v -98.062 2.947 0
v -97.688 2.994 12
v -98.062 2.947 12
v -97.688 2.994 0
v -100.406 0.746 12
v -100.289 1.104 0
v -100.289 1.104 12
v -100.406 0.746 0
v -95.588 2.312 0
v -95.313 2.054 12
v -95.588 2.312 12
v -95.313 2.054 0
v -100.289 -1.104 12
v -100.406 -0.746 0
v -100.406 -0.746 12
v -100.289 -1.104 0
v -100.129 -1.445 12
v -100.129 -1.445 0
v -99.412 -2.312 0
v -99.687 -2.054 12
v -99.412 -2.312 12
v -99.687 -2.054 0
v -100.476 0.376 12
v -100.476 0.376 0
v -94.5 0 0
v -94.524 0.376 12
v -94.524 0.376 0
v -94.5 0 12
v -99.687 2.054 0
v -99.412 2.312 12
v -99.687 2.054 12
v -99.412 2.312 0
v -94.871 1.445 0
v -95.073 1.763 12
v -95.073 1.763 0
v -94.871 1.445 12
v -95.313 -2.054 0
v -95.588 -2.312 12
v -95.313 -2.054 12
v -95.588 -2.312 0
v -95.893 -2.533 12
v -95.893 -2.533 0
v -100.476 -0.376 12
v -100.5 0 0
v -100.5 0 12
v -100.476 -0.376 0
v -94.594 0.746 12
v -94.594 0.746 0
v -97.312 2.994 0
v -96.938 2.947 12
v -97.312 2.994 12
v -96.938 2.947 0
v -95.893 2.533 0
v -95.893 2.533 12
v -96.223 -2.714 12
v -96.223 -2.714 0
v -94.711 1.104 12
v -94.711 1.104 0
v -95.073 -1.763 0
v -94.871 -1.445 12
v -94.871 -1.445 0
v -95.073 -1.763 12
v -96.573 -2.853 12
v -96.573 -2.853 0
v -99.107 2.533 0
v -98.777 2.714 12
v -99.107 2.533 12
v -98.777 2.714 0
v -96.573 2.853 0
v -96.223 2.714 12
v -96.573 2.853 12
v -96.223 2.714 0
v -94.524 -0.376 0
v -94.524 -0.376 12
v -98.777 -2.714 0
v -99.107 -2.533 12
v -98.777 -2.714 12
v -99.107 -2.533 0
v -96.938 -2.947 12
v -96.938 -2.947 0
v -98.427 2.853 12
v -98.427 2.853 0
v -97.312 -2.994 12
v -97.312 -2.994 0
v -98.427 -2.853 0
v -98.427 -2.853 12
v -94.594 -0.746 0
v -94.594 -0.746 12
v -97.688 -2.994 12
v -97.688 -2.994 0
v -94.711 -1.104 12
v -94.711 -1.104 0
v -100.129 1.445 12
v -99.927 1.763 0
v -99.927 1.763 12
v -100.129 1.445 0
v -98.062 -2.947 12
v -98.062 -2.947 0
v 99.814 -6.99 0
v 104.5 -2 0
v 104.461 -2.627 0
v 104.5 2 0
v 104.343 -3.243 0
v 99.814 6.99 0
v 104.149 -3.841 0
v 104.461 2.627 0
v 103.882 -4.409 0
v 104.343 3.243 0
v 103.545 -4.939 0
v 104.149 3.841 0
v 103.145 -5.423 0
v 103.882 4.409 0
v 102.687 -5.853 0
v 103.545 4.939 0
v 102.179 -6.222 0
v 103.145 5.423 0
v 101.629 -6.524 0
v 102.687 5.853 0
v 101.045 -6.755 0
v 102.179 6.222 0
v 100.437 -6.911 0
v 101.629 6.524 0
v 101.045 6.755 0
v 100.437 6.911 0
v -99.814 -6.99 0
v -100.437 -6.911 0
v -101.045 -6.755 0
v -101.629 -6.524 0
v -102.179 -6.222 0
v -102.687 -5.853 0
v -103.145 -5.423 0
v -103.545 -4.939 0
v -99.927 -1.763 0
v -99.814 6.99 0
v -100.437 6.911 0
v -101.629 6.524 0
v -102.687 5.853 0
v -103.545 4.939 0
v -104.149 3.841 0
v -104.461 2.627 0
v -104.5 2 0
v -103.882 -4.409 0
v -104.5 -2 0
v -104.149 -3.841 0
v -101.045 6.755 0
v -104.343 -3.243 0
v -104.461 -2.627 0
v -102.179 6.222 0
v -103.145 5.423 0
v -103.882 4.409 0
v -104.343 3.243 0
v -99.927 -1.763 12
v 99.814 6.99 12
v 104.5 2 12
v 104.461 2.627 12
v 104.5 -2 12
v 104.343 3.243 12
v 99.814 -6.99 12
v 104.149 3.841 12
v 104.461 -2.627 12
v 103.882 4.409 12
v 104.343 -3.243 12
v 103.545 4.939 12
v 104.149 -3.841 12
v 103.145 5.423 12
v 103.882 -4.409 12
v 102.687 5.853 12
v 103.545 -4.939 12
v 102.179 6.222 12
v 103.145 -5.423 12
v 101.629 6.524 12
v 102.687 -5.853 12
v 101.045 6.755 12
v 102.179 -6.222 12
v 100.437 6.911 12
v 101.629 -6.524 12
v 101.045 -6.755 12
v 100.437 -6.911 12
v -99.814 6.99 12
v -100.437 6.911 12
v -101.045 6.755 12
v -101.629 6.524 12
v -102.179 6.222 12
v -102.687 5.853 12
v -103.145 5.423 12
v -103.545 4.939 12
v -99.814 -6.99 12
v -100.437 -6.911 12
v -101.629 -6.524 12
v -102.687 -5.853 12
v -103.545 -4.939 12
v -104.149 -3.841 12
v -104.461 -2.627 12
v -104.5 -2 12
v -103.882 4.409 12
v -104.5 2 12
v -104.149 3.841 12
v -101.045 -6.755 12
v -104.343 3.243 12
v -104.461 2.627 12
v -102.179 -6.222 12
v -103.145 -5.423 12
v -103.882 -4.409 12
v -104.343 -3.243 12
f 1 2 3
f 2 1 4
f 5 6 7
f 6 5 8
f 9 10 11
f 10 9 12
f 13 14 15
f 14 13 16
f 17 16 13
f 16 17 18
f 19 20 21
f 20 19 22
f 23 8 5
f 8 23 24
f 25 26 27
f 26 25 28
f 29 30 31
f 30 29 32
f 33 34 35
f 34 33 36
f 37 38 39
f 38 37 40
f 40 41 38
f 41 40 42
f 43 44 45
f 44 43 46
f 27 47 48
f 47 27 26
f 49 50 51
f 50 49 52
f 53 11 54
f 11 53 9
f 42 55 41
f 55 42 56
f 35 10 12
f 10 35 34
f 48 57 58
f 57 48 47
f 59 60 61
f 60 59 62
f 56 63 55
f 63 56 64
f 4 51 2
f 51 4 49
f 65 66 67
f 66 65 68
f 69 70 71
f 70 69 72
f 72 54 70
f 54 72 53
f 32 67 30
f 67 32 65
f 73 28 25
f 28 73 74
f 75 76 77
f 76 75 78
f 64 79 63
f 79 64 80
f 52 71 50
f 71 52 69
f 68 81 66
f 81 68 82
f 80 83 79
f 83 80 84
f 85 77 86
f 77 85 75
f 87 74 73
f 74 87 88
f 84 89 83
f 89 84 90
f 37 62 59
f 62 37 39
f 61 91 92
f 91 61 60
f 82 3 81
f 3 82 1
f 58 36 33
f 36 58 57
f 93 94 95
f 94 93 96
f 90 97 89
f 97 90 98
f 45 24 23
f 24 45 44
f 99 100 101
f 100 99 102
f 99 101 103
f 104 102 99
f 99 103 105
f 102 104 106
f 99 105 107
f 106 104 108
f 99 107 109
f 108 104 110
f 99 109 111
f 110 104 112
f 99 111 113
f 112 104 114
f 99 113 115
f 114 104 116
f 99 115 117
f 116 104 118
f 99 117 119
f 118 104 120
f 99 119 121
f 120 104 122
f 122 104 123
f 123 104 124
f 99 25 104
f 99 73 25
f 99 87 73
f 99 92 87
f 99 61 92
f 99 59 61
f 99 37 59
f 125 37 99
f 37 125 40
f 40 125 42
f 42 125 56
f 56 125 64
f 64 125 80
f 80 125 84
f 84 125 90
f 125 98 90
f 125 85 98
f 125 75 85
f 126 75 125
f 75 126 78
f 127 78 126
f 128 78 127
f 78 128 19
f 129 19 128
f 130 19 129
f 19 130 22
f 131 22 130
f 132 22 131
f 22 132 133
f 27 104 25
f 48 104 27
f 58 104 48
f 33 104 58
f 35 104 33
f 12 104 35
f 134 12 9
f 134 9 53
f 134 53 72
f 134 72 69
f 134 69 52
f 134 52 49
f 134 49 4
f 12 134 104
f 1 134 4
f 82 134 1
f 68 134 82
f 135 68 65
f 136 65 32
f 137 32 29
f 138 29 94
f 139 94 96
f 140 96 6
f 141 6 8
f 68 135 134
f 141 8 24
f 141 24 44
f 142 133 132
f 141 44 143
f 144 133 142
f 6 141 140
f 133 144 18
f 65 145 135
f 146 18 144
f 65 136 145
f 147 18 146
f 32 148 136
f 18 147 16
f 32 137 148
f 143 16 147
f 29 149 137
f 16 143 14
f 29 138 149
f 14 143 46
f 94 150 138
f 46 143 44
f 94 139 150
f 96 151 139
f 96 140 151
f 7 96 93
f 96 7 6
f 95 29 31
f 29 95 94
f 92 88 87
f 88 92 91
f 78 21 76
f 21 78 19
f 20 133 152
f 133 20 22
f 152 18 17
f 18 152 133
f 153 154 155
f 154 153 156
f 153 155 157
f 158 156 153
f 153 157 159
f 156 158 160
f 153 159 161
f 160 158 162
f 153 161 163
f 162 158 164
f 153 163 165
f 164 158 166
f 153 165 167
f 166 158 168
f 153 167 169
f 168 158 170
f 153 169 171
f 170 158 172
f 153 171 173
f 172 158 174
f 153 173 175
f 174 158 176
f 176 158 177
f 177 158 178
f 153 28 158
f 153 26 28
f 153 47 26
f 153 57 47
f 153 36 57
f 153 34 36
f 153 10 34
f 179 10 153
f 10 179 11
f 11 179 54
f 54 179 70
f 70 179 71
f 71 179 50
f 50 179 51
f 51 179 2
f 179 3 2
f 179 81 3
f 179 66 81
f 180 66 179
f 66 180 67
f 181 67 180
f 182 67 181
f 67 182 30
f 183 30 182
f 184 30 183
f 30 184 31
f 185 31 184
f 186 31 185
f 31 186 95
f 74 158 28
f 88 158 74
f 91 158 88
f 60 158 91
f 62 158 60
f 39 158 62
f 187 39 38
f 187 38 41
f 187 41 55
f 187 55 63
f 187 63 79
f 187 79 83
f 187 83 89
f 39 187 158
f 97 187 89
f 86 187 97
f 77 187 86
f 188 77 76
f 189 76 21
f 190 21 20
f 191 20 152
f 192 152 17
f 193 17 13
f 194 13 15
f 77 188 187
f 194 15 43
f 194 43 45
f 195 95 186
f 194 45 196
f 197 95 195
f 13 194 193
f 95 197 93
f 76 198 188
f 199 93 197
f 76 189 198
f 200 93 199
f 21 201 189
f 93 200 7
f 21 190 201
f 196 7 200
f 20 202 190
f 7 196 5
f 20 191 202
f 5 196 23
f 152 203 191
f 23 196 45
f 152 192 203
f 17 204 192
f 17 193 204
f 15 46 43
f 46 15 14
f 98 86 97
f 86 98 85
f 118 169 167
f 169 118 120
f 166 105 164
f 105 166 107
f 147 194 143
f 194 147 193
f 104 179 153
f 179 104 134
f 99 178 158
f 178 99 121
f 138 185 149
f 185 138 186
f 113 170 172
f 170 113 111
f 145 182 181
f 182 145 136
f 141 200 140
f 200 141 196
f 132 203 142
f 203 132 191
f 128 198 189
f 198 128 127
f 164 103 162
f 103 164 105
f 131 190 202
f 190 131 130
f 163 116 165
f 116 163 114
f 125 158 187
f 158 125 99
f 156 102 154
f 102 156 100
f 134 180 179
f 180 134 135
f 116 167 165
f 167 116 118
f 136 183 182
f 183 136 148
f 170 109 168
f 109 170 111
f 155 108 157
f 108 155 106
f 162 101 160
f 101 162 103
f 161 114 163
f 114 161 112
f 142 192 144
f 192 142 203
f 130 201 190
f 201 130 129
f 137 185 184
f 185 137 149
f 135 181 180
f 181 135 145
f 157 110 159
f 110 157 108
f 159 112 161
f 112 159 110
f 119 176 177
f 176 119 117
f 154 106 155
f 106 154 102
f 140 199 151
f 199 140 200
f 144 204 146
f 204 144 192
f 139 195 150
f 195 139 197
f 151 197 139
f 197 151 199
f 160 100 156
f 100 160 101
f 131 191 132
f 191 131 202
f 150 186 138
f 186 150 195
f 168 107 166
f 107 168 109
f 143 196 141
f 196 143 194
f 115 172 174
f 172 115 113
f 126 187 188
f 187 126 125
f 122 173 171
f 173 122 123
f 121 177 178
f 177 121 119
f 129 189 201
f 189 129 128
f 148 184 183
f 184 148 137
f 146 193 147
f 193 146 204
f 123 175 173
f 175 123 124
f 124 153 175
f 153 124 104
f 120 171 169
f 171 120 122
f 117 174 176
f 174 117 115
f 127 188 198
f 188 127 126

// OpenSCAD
$fn = 50;


difference() {
	union() {
		hull() {
			translate(v = [-99.5000000000, 2.0000000000, 0]) {
				cylinder(h = 12, r = 5);
			}
			translate(v = [99.5000000000, 2.0000000000, 0]) {
				cylinder(h = 12, r = 5);
			}
			translate(v = [-99.5000000000, -2.0000000000, 0]) {
				cylinder(h = 12, r = 5);
			}
			translate(v = [99.5000000000, -2.0000000000, 0]) {
				cylinder(h = 12, r = 5);
			}
		}
	}
	union() {
		translate(v = [-97.5000000000, 0.0000000000, 0]) {
			cylinder(h = 12, r = 3.0000000000);
		}
		translate(v = [-97.5000000000, 0.0000000000, 0]) {
			cylinder(h = 12, r = 1.5000000000);
		}
		translate(v = [-97.5000000000, 0.0000000000, 0]) {
			cylinder(h = 12, r = 1.5000000000);
		}
		translate(v = [-97.5000000000, 0.0000000000, 0]) {
			cylinder(h = 12, r = 1.5000000000);
		}
	}
}
